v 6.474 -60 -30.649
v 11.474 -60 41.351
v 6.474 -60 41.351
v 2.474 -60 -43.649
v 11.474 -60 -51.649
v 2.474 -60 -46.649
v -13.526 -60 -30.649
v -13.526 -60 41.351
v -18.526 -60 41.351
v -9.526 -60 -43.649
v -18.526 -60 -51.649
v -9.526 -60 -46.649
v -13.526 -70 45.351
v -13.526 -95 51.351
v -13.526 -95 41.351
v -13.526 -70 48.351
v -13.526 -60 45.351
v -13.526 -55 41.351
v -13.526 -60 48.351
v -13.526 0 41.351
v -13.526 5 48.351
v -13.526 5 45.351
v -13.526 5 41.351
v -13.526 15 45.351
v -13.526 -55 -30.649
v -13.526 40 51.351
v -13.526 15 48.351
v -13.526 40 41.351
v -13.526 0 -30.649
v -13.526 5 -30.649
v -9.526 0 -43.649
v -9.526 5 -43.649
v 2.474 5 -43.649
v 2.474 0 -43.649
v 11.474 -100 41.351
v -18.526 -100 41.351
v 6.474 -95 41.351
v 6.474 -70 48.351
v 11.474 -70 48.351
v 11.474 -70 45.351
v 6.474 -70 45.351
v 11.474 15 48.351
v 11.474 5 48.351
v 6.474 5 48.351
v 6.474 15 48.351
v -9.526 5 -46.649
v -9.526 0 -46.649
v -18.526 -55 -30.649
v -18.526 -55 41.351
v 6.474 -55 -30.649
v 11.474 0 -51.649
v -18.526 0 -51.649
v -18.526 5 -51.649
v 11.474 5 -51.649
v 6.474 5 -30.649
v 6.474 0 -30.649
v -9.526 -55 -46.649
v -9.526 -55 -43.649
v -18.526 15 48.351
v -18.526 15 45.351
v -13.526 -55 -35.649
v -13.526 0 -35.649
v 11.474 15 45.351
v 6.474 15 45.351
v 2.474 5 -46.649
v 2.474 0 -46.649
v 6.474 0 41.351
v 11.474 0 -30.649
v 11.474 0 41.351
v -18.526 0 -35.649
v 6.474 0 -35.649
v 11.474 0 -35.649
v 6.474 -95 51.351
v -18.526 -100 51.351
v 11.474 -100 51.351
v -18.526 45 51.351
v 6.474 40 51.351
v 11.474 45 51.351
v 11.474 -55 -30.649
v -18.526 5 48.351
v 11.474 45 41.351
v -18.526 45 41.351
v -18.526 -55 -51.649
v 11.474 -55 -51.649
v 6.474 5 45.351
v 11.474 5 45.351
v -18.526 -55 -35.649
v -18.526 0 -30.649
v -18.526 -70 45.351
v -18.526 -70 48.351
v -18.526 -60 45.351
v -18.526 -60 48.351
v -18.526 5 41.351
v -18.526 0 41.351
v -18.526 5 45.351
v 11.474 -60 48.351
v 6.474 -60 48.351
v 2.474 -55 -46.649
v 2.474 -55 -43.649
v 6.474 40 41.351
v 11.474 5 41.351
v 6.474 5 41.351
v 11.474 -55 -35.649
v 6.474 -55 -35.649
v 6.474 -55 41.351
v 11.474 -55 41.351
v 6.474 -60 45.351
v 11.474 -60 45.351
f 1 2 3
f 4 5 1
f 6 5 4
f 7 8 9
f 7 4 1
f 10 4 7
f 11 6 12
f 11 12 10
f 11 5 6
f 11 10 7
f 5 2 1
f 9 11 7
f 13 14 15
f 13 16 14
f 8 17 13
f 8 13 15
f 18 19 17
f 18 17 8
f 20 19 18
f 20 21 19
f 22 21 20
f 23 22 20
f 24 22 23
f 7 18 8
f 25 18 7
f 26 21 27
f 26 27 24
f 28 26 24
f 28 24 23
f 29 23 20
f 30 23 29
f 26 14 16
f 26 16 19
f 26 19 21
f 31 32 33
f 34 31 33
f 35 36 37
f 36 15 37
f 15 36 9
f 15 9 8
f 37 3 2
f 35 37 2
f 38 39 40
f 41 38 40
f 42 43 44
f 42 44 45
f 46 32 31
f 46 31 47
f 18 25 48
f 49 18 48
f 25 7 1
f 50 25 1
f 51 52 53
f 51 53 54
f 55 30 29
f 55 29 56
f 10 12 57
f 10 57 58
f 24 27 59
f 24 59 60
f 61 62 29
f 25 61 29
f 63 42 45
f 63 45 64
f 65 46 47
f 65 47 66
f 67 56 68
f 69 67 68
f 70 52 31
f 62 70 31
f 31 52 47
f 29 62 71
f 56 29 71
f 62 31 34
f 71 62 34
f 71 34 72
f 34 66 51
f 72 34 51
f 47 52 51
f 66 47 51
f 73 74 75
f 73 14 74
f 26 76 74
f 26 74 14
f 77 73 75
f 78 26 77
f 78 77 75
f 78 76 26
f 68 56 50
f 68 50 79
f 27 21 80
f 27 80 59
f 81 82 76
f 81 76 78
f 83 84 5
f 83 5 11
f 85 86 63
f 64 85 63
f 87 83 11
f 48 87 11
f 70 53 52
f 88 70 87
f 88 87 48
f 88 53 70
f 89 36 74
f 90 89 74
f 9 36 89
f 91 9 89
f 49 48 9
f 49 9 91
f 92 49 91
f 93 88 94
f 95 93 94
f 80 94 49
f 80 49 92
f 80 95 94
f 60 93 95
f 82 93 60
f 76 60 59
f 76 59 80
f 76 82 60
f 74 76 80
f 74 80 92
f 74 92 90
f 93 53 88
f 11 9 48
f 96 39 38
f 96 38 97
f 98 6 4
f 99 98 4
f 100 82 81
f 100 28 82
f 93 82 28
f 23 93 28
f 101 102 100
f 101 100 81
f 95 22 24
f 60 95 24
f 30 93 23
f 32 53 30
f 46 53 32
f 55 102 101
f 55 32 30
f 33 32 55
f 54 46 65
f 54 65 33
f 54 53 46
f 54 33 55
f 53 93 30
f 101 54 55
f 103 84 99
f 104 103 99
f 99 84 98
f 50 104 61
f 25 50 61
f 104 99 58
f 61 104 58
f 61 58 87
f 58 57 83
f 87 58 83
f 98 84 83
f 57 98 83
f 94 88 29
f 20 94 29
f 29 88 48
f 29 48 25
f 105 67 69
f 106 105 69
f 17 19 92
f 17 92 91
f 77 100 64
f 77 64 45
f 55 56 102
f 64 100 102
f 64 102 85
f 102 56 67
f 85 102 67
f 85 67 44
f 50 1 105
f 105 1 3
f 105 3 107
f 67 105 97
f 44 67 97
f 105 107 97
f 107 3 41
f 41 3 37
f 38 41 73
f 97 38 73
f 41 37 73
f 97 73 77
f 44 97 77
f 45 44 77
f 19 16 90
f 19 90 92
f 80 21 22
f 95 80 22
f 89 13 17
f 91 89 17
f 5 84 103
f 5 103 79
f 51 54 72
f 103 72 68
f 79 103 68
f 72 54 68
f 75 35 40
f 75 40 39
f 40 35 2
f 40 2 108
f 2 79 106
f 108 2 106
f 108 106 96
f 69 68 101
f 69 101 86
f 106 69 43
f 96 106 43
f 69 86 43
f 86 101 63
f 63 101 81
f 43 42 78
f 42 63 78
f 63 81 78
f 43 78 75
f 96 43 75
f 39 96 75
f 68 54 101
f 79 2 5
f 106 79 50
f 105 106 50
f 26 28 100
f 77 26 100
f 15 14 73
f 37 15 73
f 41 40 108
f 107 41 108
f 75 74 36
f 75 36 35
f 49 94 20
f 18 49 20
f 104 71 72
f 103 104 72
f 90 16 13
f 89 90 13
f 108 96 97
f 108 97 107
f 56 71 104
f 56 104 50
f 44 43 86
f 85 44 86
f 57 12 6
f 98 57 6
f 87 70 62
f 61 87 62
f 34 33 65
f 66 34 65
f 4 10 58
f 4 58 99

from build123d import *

# Parameters (mm, degrees)
SKETCH1_W            = 30
SKETCH1_H            = 103
BOSS_EXTRUDE1_DEPTH  = 5
SKETCH2_W            = 12
SKETCH2_H            = 3
SKETCH2_W_2          = 20
SKETCH2_H_2          = 82
CUT_EXTRUDE1_DEPTH   = 5
SKETCH3_W            = 5
SKETCH3_H            = 10
SKETCH3_H_2          = 5
BOSS_EXTRUDE2_DEPTH  = 55
SKETCH8_W            = 30
SKETCH8_H            = 103
BOSS_EXTRUDE6_DEPTH  = 5
SKETCH10_W           = 20
SKETCH10_H           = 82
SKETCH10_W_2         = 12
SKETCH10_H_2         = 3
CUT_EXTRUDE2_DEPTH   = 5
SKETCH22_W           = 5
SKETCH22_H           = 10
BOSS_EXTRUDE7_DEPTH  = 35
SKETCH23_W           = 30
SKETCH23_H           = 10
BOSS_EXTRUDE8_DEPTH  = 5
SKETCH25_W           = 5
SKETCH25_H           = 10
BOSS_EXTRUDE9_DEPTH  = 35
SKETCH26_W           = 30
SKETCH26_H           = 10
BOSS_EXTRUDE10_DEPTH = 5
SKETCH28_W           = 3
SKETCH28_H           = 10
CUT_EXTRUDE4_DEPTH   = 34


with BuildPart() as part:
    # Sketch1 → Boss-Extrude1 (new body)
    with BuildSketch(Plane(origin=(0, 0, 0), x_dir=(1, 0, 0), z_dir=(0, 1, 0))):
        with Locations((-3.526120729, 0.1485026)):
            Rectangle(SKETCH1_W, SKETCH1_H)
    extrude(amount=BOSS_EXTRUDE1_DEPTH)

    # Sketch2 → Cut-Extrude1 (cut)
    with BuildSketch(Plane(origin=(0, 5, 0), x_dir=(1, 0, 0), z_dir=(0, 1, 0))):
        with Locations((-3.526120729, 45.1485026)):
            Rectangle(SKETCH2_W, SKETCH2_H)
        with Locations((-3.526120729, -10.3514974)):
            Rectangle(SKETCH2_W_2, SKETCH2_H_2)
    extrude(amount=-CUT_EXTRUDE1_DEPTH, mode=Mode.SUBTRACT)

    # Sketch3 → Boss-Extrude2 (add)
    with BuildSketch(Plane.XZ):
        with Locations((-16.026120729, 46.3514974)):
            Rectangle(SKETCH3_W, SKETCH3_H)
        with Locations((-16.026120729, -33.1485026)):
            Rectangle(SKETCH3_W, SKETCH3_H_2)
        with Locations((8.973879271, 46.3514974)):
            Rectangle(SKETCH3_W, SKETCH3_H)
        with Locations((8.973879271, -33.1485026)):
            Rectangle(SKETCH3_W, SKETCH3_H_2)
    extrude(amount=BOSS_EXTRUDE2_DEPTH)

    # Sketch8 → Boss-Extrude6 (add)
    with BuildSketch(Plane(origin=(0, -55, 0), x_dir=(-1, 0, 0), z_dir=(0, -1, 0))):
        with Locations((3.526120729, 0.1485026)):
            Rectangle(SKETCH8_W, SKETCH8_H)
    extrude(amount=BOSS_EXTRUDE6_DEPTH)

    # Sketch10 → Cut-Extrude2 (cut)
    with BuildSketch(Plane.XZ.offset(60)):
        with Locations((-3.526120729, 10.3514974)):
            Rectangle(SKETCH10_W, SKETCH10_H)
        with Locations((-3.526120729, -45.1485026)):
            Rectangle(SKETCH10_W_2, SKETCH10_H_2)
    extrude(amount=-CUT_EXTRUDE2_DEPTH, mode=Mode.SUBTRACT)

    # Sketch22 → Boss-Extrude7 (add)
    with BuildSketch(Plane(origin=(0, 5, 0), x_dir=(1, 0, 0), z_dir=(0, 1, 0))):
        with Locations((-16.026120729, -46.3514974)):
            Rectangle(SKETCH22_W, SKETCH22_H)
        with Locations((8.973879271, -46.3514974)):
            Rectangle(SKETCH22_W, SKETCH22_H)
    extrude(amount=BOSS_EXTRUDE7_DEPTH)

    # Sketch23 → Boss-Extrude8 (add)
    with BuildSketch(Plane(origin=(0, 40, 0), x_dir=(1, 0, 0), z_dir=(0, 1, 0))):
        with Locations((-3.526120729, -46.3514974)):
            Rectangle(SKETCH23_W, SKETCH23_H)
    extrude(amount=BOSS_EXTRUDE8_DEPTH)

    # Sketch25 → Boss-Extrude9 (add)
    with BuildSketch(Plane(origin=(0, -60, 0), x_dir=(-1, 0, 0), z_dir=(0, -1, 0))):
        with Locations((16.026120729, -46.3514974)):
            Rectangle(SKETCH25_W, SKETCH25_H)
        with Locations((-8.973879271, -46.3514974)):
            Rectangle(SKETCH25_W, SKETCH25_H)
    extrude(amount=BOSS_EXTRUDE9_DEPTH)

    # Sketch26 → Boss-Extrude10 (add)
    with BuildSketch(Plane.XZ.offset(95)):
        with Locations((-3.526120729, 46.3514974)):
            Rectangle(SKETCH26_W, SKETCH26_H)
    extrude(amount=BOSS_EXTRUDE10_DEPTH)

    # Sketch28 → Cut-Extrude4 (cut)
    with BuildSketch(Plane(origin=(11.473879271, 0, 0), x_dir=(0, 0, -1), z_dir=(1, 0, 0))):
        with Locations((-46.8514974, 10)):
            Rectangle(SKETCH28_W, SKETCH28_H)
        with Locations((-46.8514974, -65)):
            Rectangle(SKETCH28_W, SKETCH28_H)
    extrude(amount=-CUT_EXTRUDE4_DEPTH, mode=Mode.SUBTRACT)


solid = part.part
